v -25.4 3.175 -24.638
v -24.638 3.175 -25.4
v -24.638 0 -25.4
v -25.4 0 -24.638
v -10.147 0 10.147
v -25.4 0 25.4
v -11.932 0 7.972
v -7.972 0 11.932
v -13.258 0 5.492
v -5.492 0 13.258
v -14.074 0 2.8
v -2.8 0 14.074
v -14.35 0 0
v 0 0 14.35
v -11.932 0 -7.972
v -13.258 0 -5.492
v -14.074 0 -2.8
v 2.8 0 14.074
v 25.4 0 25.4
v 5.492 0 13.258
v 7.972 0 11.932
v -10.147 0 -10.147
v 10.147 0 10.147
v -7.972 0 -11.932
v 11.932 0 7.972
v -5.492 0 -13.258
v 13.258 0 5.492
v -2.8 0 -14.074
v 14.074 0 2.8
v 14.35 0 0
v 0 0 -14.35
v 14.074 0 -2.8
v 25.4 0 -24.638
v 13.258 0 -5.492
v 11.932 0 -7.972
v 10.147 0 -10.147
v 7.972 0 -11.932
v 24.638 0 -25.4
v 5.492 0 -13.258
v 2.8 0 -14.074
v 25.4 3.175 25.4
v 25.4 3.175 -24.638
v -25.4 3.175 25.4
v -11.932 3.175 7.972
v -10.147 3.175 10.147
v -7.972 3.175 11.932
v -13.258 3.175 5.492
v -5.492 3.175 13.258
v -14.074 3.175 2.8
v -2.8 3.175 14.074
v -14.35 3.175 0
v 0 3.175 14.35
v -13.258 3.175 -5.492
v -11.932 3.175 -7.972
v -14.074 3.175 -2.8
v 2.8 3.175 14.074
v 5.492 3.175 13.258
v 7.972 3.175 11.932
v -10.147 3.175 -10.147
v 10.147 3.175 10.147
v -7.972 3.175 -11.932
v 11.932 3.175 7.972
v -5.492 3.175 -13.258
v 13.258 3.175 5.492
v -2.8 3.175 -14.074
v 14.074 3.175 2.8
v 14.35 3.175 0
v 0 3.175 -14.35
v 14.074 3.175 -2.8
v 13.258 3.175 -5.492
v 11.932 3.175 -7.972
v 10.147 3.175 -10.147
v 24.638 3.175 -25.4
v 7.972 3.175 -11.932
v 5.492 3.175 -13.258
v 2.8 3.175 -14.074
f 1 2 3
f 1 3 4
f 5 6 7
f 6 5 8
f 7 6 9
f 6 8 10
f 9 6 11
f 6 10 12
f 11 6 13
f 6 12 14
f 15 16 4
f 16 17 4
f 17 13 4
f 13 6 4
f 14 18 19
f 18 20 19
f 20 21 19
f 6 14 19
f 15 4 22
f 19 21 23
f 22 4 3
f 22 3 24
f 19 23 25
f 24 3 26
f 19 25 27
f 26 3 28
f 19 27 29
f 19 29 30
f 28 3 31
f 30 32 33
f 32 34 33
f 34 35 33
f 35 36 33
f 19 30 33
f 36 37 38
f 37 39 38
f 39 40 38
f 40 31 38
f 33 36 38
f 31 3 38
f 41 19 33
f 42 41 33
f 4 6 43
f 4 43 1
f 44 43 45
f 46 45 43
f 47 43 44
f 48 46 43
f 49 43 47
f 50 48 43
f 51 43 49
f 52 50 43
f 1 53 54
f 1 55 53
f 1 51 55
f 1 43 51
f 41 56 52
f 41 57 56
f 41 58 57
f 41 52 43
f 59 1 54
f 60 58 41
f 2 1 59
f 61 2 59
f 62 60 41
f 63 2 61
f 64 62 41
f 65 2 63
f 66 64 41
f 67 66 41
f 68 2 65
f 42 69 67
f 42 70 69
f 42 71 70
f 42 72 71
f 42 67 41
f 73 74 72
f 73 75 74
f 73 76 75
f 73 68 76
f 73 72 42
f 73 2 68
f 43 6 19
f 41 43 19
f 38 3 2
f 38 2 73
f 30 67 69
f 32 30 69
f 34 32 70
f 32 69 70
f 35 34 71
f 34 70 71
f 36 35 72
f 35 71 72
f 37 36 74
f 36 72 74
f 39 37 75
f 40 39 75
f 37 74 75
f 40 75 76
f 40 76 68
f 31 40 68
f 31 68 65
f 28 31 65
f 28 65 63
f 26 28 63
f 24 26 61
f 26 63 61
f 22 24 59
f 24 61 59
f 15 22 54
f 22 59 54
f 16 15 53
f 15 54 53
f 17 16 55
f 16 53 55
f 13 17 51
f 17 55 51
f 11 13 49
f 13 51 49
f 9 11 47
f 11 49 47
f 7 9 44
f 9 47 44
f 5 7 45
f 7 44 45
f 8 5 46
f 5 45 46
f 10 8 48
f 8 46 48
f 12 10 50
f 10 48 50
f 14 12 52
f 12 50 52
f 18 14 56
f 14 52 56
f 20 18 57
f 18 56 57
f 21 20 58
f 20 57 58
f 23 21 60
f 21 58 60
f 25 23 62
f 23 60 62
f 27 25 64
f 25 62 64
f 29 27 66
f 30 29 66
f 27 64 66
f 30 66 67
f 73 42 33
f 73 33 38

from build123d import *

# Parameters (mm, degrees)
SKETCH1_W           = 50.8
SKETCH1_H           = 50.8
BOSS_EXTRUDE1_DEPTH = 3.175
SKETCH2_R           = 14.35
CUT_EXTRUDE1_DEPTH  = 3.175
CUT_EXTRUDE2_DEPTH  = 3.175


with BuildPart() as part:
    # Sketch1 → Boss-Extrude1 (new body)
    with BuildSketch(Plane(origin=(0, 0, 0), x_dir=(1, 0, 0), z_dir=(0, 1, 0))):
        Rectangle(SKETCH1_W, SKETCH1_H)
    extrude(amount=BOSS_EXTRUDE1_DEPTH)

    # Sketch2 → Cut-Extrude1 (cut)
    with BuildSketch(Plane(origin=(0, 3.175, 0), x_dir=(1, 0, 0), z_dir=(0, 1, 0))):
        Circle(SKETCH2_R)
    extrude(amount=-CUT_EXTRUDE1_DEPTH, mode=Mode.SUBTRACT)

    # Sketch3 → Cut-Extrude2 (cut)
    with BuildSketch(Plane(origin=(0, 3.175, 0), x_dir=(1, 0, 0), z_dir=(0, 1, 0))):
        Polygon((-25.4, 25.4), (-24.638, 25.4), (-25.4, 24.638), align=None)
        Polygon((25.4, 25.4), (25.4, 24.638), (24.638, 25.4), align=None)
    extrude(amount=-CUT_EXTRUDE2_DEPTH, mode=Mode.SUBTRACT)


solid = part.part
